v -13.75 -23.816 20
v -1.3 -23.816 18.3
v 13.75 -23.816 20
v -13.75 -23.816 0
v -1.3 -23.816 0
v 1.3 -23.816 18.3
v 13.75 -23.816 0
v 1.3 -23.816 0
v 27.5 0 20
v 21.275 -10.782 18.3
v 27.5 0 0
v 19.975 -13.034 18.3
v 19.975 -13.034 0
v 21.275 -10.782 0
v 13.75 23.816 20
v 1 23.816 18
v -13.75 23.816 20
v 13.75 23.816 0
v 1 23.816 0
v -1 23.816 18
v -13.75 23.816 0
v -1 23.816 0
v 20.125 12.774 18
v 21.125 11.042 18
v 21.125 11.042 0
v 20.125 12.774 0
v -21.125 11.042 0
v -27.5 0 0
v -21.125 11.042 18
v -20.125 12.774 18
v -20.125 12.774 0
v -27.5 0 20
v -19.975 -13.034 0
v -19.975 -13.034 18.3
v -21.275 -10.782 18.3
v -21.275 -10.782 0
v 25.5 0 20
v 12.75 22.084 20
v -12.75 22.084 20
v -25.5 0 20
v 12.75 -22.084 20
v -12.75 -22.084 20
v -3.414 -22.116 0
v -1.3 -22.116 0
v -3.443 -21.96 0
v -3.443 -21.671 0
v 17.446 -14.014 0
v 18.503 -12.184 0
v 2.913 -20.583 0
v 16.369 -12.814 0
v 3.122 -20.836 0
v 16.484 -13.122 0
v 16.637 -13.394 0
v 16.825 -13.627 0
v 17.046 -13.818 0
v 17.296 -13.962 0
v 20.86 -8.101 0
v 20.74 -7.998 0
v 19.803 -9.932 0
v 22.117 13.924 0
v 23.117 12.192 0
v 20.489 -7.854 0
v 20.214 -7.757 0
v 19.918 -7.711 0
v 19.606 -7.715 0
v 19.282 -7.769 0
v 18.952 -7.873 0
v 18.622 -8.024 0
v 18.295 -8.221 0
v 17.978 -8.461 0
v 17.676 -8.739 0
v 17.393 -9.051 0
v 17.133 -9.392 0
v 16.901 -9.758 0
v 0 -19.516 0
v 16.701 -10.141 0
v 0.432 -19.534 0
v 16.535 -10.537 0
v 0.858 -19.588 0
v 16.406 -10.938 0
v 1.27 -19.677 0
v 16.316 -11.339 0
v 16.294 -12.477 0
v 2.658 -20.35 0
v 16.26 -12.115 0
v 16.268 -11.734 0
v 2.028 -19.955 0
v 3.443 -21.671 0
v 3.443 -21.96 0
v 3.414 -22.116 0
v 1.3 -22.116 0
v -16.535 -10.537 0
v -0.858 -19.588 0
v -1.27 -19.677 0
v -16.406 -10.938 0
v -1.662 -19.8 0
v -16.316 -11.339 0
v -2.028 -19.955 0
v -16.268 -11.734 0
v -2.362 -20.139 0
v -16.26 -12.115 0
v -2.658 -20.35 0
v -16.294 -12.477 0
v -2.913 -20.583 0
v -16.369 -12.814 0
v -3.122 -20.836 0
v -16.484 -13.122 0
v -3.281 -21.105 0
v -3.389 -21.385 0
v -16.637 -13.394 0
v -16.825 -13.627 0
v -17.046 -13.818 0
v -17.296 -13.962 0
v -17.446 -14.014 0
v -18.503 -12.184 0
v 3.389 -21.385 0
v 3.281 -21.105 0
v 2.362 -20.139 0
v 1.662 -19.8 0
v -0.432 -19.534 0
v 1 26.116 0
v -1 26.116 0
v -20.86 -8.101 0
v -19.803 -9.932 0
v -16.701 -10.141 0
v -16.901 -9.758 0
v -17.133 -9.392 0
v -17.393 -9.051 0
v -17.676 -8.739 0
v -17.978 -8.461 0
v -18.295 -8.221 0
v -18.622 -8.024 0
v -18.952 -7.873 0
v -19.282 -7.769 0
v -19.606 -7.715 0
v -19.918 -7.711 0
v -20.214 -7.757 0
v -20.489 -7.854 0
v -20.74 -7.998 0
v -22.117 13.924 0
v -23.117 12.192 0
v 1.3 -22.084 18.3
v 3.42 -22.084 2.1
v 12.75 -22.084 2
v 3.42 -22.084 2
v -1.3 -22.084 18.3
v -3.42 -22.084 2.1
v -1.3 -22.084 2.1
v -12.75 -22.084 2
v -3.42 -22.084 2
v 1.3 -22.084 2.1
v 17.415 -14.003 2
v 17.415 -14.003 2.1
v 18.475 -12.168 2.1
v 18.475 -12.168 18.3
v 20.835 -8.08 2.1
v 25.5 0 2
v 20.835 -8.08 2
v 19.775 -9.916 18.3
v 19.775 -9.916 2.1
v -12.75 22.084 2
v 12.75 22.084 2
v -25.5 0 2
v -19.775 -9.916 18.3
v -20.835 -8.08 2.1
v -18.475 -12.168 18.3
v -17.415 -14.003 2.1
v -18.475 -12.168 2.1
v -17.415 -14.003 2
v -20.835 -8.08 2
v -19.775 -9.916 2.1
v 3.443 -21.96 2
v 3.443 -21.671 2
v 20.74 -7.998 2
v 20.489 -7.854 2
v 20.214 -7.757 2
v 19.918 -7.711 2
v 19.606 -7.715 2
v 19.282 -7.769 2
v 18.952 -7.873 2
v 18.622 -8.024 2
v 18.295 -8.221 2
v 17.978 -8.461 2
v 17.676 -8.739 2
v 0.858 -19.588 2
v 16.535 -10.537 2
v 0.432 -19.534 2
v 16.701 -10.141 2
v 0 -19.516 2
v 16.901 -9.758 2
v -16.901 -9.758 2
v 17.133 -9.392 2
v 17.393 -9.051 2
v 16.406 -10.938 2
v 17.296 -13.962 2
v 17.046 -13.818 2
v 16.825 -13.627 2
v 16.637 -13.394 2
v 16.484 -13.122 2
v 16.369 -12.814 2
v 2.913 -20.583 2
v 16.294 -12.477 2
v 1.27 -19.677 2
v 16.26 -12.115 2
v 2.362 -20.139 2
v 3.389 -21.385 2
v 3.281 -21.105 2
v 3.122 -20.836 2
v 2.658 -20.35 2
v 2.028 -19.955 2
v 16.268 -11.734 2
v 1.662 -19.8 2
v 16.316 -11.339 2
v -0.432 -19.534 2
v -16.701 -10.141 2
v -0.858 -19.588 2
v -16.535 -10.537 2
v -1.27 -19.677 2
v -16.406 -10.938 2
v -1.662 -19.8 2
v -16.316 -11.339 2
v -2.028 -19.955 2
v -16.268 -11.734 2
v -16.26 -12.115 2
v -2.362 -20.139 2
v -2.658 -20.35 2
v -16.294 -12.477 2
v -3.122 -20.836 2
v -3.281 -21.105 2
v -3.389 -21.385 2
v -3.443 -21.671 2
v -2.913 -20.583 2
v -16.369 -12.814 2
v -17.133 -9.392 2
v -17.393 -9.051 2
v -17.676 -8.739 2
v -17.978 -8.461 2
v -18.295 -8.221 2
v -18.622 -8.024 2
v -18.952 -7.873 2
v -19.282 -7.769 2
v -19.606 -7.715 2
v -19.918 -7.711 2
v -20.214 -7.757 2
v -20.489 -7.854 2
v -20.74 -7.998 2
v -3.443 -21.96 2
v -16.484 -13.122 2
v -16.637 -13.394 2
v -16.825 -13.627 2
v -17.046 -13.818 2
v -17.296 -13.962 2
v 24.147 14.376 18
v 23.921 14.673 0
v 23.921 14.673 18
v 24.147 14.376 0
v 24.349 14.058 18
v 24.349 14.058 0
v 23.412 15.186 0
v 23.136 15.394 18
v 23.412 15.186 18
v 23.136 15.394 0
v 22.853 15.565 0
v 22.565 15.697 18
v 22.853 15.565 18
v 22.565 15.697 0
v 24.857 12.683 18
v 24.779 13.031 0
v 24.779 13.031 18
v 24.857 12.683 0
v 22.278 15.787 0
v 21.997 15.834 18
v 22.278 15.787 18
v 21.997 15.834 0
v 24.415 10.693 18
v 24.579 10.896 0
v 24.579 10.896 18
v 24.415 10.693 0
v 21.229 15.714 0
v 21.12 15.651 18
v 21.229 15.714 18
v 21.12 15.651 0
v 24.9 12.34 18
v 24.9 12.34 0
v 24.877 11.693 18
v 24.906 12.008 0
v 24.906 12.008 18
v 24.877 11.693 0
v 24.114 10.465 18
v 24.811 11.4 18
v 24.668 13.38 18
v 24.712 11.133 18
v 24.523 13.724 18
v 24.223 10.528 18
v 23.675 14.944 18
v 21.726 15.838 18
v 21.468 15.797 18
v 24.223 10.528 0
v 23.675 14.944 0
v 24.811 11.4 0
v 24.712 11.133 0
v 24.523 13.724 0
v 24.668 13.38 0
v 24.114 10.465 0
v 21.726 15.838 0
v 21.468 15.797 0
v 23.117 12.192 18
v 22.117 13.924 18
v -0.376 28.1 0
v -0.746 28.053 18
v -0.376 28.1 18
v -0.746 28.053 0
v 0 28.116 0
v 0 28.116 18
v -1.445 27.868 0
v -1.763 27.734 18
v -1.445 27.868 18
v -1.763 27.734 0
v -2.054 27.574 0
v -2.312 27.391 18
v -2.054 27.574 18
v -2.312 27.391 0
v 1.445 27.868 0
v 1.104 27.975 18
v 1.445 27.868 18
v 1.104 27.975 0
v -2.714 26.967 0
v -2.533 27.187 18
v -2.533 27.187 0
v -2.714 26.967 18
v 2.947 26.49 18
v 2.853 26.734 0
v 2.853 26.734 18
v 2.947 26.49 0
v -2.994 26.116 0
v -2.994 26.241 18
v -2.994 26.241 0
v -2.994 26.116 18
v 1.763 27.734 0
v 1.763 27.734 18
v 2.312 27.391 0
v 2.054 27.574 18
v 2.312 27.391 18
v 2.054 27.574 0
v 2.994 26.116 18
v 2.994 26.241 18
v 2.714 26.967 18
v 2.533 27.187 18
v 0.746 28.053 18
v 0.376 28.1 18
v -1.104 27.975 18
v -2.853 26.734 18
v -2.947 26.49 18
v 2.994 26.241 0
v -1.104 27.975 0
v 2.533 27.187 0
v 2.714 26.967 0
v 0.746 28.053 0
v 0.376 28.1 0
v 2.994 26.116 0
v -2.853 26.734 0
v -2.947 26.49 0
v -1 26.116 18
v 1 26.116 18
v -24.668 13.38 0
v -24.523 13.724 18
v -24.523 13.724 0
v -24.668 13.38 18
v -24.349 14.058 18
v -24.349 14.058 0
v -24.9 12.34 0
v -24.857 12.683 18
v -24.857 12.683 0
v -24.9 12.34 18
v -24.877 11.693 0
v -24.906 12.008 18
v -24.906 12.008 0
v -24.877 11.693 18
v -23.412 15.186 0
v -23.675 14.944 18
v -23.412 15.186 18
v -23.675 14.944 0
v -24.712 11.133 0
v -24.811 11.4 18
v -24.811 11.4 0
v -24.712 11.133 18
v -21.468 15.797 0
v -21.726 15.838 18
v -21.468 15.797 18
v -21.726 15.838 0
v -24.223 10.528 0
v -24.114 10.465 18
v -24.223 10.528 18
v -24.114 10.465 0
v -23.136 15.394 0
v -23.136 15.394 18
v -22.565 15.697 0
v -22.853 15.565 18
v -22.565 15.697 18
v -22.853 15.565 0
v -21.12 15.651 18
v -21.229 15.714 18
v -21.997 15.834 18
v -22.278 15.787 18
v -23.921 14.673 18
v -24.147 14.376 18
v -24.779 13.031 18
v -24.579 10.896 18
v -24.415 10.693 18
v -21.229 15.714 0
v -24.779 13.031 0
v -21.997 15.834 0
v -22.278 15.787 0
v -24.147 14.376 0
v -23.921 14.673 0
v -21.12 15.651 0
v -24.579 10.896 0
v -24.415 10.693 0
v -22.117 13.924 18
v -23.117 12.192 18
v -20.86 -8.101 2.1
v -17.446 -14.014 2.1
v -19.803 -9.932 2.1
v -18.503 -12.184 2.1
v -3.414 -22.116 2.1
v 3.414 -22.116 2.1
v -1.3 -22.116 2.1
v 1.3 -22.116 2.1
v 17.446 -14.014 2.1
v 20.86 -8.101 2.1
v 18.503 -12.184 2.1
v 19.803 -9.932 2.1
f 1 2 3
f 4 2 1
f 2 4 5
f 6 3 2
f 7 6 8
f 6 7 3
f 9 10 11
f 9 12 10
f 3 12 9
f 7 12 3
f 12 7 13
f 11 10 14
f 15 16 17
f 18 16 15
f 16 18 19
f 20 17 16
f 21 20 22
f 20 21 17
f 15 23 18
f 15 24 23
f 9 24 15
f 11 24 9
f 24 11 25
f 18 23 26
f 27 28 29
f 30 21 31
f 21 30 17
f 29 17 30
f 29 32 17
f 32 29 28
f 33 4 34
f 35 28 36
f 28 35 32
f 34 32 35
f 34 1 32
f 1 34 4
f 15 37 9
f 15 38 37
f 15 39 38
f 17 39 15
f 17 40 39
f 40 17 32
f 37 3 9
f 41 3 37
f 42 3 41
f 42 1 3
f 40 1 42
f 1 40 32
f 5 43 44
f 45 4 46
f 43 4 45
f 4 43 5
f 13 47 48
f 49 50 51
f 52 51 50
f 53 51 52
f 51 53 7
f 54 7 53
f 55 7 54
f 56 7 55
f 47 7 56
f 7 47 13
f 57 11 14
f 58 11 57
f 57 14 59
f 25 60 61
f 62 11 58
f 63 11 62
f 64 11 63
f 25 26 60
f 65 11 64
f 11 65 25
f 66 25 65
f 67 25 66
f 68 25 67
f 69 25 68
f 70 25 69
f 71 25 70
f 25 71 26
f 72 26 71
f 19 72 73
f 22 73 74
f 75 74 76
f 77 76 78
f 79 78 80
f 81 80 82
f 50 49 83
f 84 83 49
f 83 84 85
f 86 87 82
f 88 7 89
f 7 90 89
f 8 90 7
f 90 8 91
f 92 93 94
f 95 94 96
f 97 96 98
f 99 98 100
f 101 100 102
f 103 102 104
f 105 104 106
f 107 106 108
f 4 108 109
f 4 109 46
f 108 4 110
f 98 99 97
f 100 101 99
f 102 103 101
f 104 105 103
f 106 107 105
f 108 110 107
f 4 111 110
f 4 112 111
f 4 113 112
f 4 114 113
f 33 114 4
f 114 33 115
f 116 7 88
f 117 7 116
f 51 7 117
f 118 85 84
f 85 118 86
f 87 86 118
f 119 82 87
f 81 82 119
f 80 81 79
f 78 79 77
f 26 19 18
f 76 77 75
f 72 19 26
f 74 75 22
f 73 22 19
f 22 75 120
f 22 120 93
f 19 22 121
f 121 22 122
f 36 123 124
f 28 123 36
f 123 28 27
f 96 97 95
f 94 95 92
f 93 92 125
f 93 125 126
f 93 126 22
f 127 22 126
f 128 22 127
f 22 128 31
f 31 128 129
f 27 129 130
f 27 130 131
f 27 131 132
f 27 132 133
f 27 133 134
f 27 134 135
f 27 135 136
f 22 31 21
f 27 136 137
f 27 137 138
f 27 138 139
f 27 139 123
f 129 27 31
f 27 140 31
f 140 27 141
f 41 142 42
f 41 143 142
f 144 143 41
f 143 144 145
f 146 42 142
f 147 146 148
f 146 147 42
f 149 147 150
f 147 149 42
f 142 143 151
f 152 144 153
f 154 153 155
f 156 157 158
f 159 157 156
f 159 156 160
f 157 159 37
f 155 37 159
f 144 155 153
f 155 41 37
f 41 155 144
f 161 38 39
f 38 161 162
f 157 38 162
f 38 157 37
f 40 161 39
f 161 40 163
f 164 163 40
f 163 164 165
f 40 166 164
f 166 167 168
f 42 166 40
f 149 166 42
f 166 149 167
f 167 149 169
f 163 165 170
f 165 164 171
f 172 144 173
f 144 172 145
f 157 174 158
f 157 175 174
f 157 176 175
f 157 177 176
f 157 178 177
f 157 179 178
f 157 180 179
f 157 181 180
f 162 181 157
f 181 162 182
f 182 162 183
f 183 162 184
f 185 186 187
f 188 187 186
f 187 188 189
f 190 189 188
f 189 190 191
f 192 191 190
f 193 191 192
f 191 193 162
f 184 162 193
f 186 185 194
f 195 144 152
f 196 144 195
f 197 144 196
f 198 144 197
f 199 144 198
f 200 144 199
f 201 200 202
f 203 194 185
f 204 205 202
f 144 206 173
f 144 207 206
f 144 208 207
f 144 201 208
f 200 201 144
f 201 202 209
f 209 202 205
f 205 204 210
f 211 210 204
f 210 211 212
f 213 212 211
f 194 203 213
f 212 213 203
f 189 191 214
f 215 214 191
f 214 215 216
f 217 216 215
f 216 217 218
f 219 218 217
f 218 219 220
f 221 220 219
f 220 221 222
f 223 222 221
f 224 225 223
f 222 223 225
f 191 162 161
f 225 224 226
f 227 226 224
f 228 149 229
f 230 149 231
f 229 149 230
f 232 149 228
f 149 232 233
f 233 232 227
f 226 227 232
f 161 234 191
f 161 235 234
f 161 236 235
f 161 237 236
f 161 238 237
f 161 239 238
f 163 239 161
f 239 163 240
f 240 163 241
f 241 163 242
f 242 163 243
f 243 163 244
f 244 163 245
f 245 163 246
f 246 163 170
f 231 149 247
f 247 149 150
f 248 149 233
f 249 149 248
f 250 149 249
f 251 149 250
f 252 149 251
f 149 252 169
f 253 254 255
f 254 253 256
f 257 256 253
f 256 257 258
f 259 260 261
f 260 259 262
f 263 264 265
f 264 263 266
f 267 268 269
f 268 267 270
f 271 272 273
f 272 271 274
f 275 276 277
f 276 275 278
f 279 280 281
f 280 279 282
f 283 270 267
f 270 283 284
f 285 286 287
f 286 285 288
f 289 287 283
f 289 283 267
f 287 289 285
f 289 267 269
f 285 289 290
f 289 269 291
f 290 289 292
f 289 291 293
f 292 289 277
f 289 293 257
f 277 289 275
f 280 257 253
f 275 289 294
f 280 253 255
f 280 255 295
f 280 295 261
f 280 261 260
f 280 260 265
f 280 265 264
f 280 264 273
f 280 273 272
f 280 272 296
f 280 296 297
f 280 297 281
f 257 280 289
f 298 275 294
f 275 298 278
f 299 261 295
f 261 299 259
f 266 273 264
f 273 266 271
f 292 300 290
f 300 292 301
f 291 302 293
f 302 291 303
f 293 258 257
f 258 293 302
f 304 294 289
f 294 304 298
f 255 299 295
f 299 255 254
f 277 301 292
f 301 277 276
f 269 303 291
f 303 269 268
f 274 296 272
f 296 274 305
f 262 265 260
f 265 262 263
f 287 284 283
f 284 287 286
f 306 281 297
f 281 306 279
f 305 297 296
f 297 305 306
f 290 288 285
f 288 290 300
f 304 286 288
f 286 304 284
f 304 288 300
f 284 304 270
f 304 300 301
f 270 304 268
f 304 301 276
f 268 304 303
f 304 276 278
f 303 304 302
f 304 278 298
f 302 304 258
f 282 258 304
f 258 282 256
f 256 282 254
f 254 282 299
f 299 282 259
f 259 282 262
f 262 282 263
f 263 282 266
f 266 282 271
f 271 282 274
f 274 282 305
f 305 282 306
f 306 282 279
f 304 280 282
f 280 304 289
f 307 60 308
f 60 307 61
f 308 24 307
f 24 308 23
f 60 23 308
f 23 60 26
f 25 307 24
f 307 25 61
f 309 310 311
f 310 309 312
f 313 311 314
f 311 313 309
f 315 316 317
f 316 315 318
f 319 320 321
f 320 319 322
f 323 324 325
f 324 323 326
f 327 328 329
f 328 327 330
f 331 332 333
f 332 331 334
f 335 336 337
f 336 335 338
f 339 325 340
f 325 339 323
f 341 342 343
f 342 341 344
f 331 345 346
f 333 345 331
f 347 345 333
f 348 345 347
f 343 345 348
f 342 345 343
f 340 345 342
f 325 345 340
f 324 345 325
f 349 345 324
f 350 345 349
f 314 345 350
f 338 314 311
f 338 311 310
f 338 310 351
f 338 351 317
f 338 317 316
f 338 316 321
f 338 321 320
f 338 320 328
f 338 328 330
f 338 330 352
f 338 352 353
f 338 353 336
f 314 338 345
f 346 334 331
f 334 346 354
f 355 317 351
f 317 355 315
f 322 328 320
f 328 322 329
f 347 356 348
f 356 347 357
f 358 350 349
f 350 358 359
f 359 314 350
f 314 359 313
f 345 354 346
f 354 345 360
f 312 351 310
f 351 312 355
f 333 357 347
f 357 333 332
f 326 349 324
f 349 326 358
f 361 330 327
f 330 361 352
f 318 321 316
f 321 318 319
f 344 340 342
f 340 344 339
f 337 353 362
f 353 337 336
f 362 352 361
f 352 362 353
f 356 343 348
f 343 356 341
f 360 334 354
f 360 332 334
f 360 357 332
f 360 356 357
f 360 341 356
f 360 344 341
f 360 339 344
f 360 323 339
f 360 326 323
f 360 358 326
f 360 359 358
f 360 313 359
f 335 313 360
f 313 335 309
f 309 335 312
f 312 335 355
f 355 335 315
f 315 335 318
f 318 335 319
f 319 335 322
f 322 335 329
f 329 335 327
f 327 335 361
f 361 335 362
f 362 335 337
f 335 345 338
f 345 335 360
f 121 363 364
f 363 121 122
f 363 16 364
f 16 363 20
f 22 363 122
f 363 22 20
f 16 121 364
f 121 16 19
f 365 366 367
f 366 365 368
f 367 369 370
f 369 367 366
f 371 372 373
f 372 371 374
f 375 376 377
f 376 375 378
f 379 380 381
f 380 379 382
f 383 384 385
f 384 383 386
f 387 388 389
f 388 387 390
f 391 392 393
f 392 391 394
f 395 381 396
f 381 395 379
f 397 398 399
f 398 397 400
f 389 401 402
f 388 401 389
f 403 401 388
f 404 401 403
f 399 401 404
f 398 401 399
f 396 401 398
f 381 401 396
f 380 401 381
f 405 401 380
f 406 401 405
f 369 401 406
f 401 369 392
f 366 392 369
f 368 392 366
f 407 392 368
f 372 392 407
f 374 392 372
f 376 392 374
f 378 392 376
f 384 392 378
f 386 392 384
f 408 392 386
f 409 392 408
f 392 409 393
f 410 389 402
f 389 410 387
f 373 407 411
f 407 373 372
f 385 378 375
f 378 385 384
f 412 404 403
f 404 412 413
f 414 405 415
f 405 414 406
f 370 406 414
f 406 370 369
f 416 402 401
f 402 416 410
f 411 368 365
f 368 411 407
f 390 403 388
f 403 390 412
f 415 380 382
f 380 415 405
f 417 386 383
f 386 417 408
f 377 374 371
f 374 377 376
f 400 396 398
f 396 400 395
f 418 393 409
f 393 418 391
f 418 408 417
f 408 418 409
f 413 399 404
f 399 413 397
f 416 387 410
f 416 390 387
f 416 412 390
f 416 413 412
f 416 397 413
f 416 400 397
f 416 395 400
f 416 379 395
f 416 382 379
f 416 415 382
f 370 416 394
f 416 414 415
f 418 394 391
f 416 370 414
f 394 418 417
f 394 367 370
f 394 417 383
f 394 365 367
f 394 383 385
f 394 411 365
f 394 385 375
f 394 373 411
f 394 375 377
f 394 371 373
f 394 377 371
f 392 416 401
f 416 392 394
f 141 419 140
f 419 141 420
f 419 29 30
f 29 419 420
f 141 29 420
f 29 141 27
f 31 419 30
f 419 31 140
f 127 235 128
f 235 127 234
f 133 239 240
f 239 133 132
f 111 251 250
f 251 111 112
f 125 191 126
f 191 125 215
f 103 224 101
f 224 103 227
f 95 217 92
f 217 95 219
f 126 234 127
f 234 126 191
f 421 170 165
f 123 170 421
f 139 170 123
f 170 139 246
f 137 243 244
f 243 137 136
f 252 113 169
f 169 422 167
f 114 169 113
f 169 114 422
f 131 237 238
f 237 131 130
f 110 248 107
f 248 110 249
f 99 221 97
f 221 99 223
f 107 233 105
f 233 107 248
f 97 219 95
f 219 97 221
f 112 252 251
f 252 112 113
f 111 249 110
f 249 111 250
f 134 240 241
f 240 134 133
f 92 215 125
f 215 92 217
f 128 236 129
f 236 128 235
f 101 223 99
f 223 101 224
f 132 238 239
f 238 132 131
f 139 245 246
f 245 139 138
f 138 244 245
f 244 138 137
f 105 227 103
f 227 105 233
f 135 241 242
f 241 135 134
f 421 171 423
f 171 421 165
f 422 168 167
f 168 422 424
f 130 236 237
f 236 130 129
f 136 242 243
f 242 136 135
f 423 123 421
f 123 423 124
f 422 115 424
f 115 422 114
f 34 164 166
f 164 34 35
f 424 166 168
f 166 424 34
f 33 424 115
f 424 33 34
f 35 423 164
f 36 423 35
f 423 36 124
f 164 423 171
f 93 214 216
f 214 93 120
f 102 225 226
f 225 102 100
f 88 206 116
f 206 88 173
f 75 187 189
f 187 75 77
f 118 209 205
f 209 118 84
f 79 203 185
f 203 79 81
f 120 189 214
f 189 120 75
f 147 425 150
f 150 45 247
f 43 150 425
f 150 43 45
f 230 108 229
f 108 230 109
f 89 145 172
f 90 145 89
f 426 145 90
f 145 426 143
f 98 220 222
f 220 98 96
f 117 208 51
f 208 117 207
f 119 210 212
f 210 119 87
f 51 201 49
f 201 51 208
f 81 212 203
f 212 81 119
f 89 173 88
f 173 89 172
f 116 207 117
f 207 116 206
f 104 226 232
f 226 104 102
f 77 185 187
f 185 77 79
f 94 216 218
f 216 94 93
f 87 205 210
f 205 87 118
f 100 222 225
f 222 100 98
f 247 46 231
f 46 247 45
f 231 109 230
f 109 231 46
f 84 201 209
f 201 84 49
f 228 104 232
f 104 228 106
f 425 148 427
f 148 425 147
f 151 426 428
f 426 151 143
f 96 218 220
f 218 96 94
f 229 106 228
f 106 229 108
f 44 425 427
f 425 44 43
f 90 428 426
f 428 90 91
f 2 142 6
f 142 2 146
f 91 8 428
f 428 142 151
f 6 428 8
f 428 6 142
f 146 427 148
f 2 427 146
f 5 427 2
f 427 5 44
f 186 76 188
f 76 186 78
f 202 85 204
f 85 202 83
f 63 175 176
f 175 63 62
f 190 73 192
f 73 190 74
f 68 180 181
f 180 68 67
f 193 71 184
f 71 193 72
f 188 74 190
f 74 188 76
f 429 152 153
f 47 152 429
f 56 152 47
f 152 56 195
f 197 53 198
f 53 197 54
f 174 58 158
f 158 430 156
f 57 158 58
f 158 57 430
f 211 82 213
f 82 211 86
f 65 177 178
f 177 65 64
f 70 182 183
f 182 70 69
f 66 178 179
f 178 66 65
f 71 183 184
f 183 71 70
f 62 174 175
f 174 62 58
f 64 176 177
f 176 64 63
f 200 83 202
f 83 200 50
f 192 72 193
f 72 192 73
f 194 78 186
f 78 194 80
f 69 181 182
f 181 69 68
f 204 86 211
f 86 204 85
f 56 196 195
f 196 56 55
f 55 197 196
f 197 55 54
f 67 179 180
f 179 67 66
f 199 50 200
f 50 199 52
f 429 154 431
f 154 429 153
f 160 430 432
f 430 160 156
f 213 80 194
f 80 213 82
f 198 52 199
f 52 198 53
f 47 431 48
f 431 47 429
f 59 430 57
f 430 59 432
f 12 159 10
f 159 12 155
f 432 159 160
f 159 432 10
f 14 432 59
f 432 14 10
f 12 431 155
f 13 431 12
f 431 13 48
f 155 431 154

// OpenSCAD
// ////////////////////////////////////////////////////////////
//
// Modular desk tidy.
//
// Copyright 2018 Kevin F. Quinn
//
// This work is licensed under the Creative Commons
// Attribution-ShareAlike 4.0 International License. To view a
// copy of the license, visit
// https://creativecommons.org/licenses/by-sa/4.0/
//
// History
// 2018-02-11 1.0 Initial publication
//
// A configurable modular desk tidy.
// Inspired by the Mew Mew system on Thingiverse (7007, 289516, 1723801)
// 

// Essential design is a hexagon base, interlocking slots and bars.
//
// Configure the diameter, height, wall thickness, and how high the
// slot/lugs are.
//
// Choose whether you want a lug or a slot (or nothing) on each face
// with the six face parameters.
//
// Simplest way to ensure all the pieces can interlock is to used
// the defaults here, and orient all the pieces with the three slot
// faces towards you for assembly - the front faces of your set will
// have the redundant slots, and the rear faces the redundant lugs.
//
// To get a set that present plain faces on all the external edges
// of the assembled set, generate each piece with the set of lugs and
// slots that suffice. Hint - to ensure your set is actually possible
// to assemble, the simplest approach is to follow the same pattern;
// for each individual piece, select slots for the connecting faces
// that are towards the front, and lugs for the connecting faces
// that are towards the back.

// Diameter of the base hexagon (i.e. vertex to opposing vertex)
module_diameter=55; // [10:140]

// Height of the module
module_height=20; // [20:10:100]

// Thickness of the module walls
module_wall=2; // [0.8:0.4:2.4]

// Lug/slot height
slot_height=18; // [2:2:40]

// Clearance to allow between slots and the lugs
clearance=0.3; // [0.1:0.05:0.4]

// Configuration of first side; whether it is plain, has a lug, or has a slot
face_1="lug"; // ["plain","lug","slot"]
// Configuration of second side, as the first
face_2="lug"; // ["plain","lug","slot"]
// Configuration of third side, as the first
face_3="lug"; // ["plain","lug","slot"]
// Configuration of fourth side, as the first
face_4="slot"; // ["plain","lug","slot"]
// Configuration of fifth side, as the first
face_5="slot"; // ["plain","lug","slot"]
// Configuration of sixth side, as the first
face_6="slot"; // ["plain","lug","slot"]

module endcustomizer() {}
sp=0.1; // spill distance for differences (just keeps the preview clean)


module tidy(diameter, height, wall, fv) {

  distance_to_edge=(diameter/2)*cos(30);

  difference() {
    
    union() {
      difference() {
      // main hexagonal tower
      cylinder(d=diameter, h=height, $fn=6);
      // centre    
      translate ([0,0,wall])
      cylinder(d=diameter-wall*2, h=height-wall+sp, $fn=6);
      }
      // lugs
      for (face=[0:1:5]) {
        if (fv[face]=="lug") {
          rotate(a=30+face*60,v=[0,0,1]) {
            translate([distance_to_edge,-wall/2,0])
            cube([wall+clearance,wall,slot_height]);
            translate([distance_to_edge+wall+clearance,0,0])
            scale([1.0,1.5,1.0])
            difference() {
              cylinder(r=wall, h=slot_height, $fn=50);
              translate([-wall,-wall,-sp])
              cube([wall,wall*2,slot_height+sp*2]);
            }
          }
        }
      }
    }

    // slots
    for (face=[0:1:5]) {
      if (fv[face]=="slot") {
        rotate(a=30+face*60,v=[0,0,1]) {
          translate([distance_to_edge-wall-sp,-wall/2-clearance,-sp])
          cube([wall+sp*2,wall+clearance*2,slot_height+clearance+sp]);
          translate([distance_to_edge-wall,0,-sp])
          scale([1.0,1.5,1.0])
          difference() {
            cylinder(r=wall+clearance, h=wall+sp*2, $fn=50);
            translate([clearance,-wall-clearance,0])
            cube([wall+clearance,(wall+clearance)*2,wall+sp*2]);
          }
        }
      }
    }
  }

}

tidy(diameter=module_diameter,
     height=module_height,
     wall=module_wall,
     fv=[face_1,face_2,face_3,face_4,face_5,face_6]);
